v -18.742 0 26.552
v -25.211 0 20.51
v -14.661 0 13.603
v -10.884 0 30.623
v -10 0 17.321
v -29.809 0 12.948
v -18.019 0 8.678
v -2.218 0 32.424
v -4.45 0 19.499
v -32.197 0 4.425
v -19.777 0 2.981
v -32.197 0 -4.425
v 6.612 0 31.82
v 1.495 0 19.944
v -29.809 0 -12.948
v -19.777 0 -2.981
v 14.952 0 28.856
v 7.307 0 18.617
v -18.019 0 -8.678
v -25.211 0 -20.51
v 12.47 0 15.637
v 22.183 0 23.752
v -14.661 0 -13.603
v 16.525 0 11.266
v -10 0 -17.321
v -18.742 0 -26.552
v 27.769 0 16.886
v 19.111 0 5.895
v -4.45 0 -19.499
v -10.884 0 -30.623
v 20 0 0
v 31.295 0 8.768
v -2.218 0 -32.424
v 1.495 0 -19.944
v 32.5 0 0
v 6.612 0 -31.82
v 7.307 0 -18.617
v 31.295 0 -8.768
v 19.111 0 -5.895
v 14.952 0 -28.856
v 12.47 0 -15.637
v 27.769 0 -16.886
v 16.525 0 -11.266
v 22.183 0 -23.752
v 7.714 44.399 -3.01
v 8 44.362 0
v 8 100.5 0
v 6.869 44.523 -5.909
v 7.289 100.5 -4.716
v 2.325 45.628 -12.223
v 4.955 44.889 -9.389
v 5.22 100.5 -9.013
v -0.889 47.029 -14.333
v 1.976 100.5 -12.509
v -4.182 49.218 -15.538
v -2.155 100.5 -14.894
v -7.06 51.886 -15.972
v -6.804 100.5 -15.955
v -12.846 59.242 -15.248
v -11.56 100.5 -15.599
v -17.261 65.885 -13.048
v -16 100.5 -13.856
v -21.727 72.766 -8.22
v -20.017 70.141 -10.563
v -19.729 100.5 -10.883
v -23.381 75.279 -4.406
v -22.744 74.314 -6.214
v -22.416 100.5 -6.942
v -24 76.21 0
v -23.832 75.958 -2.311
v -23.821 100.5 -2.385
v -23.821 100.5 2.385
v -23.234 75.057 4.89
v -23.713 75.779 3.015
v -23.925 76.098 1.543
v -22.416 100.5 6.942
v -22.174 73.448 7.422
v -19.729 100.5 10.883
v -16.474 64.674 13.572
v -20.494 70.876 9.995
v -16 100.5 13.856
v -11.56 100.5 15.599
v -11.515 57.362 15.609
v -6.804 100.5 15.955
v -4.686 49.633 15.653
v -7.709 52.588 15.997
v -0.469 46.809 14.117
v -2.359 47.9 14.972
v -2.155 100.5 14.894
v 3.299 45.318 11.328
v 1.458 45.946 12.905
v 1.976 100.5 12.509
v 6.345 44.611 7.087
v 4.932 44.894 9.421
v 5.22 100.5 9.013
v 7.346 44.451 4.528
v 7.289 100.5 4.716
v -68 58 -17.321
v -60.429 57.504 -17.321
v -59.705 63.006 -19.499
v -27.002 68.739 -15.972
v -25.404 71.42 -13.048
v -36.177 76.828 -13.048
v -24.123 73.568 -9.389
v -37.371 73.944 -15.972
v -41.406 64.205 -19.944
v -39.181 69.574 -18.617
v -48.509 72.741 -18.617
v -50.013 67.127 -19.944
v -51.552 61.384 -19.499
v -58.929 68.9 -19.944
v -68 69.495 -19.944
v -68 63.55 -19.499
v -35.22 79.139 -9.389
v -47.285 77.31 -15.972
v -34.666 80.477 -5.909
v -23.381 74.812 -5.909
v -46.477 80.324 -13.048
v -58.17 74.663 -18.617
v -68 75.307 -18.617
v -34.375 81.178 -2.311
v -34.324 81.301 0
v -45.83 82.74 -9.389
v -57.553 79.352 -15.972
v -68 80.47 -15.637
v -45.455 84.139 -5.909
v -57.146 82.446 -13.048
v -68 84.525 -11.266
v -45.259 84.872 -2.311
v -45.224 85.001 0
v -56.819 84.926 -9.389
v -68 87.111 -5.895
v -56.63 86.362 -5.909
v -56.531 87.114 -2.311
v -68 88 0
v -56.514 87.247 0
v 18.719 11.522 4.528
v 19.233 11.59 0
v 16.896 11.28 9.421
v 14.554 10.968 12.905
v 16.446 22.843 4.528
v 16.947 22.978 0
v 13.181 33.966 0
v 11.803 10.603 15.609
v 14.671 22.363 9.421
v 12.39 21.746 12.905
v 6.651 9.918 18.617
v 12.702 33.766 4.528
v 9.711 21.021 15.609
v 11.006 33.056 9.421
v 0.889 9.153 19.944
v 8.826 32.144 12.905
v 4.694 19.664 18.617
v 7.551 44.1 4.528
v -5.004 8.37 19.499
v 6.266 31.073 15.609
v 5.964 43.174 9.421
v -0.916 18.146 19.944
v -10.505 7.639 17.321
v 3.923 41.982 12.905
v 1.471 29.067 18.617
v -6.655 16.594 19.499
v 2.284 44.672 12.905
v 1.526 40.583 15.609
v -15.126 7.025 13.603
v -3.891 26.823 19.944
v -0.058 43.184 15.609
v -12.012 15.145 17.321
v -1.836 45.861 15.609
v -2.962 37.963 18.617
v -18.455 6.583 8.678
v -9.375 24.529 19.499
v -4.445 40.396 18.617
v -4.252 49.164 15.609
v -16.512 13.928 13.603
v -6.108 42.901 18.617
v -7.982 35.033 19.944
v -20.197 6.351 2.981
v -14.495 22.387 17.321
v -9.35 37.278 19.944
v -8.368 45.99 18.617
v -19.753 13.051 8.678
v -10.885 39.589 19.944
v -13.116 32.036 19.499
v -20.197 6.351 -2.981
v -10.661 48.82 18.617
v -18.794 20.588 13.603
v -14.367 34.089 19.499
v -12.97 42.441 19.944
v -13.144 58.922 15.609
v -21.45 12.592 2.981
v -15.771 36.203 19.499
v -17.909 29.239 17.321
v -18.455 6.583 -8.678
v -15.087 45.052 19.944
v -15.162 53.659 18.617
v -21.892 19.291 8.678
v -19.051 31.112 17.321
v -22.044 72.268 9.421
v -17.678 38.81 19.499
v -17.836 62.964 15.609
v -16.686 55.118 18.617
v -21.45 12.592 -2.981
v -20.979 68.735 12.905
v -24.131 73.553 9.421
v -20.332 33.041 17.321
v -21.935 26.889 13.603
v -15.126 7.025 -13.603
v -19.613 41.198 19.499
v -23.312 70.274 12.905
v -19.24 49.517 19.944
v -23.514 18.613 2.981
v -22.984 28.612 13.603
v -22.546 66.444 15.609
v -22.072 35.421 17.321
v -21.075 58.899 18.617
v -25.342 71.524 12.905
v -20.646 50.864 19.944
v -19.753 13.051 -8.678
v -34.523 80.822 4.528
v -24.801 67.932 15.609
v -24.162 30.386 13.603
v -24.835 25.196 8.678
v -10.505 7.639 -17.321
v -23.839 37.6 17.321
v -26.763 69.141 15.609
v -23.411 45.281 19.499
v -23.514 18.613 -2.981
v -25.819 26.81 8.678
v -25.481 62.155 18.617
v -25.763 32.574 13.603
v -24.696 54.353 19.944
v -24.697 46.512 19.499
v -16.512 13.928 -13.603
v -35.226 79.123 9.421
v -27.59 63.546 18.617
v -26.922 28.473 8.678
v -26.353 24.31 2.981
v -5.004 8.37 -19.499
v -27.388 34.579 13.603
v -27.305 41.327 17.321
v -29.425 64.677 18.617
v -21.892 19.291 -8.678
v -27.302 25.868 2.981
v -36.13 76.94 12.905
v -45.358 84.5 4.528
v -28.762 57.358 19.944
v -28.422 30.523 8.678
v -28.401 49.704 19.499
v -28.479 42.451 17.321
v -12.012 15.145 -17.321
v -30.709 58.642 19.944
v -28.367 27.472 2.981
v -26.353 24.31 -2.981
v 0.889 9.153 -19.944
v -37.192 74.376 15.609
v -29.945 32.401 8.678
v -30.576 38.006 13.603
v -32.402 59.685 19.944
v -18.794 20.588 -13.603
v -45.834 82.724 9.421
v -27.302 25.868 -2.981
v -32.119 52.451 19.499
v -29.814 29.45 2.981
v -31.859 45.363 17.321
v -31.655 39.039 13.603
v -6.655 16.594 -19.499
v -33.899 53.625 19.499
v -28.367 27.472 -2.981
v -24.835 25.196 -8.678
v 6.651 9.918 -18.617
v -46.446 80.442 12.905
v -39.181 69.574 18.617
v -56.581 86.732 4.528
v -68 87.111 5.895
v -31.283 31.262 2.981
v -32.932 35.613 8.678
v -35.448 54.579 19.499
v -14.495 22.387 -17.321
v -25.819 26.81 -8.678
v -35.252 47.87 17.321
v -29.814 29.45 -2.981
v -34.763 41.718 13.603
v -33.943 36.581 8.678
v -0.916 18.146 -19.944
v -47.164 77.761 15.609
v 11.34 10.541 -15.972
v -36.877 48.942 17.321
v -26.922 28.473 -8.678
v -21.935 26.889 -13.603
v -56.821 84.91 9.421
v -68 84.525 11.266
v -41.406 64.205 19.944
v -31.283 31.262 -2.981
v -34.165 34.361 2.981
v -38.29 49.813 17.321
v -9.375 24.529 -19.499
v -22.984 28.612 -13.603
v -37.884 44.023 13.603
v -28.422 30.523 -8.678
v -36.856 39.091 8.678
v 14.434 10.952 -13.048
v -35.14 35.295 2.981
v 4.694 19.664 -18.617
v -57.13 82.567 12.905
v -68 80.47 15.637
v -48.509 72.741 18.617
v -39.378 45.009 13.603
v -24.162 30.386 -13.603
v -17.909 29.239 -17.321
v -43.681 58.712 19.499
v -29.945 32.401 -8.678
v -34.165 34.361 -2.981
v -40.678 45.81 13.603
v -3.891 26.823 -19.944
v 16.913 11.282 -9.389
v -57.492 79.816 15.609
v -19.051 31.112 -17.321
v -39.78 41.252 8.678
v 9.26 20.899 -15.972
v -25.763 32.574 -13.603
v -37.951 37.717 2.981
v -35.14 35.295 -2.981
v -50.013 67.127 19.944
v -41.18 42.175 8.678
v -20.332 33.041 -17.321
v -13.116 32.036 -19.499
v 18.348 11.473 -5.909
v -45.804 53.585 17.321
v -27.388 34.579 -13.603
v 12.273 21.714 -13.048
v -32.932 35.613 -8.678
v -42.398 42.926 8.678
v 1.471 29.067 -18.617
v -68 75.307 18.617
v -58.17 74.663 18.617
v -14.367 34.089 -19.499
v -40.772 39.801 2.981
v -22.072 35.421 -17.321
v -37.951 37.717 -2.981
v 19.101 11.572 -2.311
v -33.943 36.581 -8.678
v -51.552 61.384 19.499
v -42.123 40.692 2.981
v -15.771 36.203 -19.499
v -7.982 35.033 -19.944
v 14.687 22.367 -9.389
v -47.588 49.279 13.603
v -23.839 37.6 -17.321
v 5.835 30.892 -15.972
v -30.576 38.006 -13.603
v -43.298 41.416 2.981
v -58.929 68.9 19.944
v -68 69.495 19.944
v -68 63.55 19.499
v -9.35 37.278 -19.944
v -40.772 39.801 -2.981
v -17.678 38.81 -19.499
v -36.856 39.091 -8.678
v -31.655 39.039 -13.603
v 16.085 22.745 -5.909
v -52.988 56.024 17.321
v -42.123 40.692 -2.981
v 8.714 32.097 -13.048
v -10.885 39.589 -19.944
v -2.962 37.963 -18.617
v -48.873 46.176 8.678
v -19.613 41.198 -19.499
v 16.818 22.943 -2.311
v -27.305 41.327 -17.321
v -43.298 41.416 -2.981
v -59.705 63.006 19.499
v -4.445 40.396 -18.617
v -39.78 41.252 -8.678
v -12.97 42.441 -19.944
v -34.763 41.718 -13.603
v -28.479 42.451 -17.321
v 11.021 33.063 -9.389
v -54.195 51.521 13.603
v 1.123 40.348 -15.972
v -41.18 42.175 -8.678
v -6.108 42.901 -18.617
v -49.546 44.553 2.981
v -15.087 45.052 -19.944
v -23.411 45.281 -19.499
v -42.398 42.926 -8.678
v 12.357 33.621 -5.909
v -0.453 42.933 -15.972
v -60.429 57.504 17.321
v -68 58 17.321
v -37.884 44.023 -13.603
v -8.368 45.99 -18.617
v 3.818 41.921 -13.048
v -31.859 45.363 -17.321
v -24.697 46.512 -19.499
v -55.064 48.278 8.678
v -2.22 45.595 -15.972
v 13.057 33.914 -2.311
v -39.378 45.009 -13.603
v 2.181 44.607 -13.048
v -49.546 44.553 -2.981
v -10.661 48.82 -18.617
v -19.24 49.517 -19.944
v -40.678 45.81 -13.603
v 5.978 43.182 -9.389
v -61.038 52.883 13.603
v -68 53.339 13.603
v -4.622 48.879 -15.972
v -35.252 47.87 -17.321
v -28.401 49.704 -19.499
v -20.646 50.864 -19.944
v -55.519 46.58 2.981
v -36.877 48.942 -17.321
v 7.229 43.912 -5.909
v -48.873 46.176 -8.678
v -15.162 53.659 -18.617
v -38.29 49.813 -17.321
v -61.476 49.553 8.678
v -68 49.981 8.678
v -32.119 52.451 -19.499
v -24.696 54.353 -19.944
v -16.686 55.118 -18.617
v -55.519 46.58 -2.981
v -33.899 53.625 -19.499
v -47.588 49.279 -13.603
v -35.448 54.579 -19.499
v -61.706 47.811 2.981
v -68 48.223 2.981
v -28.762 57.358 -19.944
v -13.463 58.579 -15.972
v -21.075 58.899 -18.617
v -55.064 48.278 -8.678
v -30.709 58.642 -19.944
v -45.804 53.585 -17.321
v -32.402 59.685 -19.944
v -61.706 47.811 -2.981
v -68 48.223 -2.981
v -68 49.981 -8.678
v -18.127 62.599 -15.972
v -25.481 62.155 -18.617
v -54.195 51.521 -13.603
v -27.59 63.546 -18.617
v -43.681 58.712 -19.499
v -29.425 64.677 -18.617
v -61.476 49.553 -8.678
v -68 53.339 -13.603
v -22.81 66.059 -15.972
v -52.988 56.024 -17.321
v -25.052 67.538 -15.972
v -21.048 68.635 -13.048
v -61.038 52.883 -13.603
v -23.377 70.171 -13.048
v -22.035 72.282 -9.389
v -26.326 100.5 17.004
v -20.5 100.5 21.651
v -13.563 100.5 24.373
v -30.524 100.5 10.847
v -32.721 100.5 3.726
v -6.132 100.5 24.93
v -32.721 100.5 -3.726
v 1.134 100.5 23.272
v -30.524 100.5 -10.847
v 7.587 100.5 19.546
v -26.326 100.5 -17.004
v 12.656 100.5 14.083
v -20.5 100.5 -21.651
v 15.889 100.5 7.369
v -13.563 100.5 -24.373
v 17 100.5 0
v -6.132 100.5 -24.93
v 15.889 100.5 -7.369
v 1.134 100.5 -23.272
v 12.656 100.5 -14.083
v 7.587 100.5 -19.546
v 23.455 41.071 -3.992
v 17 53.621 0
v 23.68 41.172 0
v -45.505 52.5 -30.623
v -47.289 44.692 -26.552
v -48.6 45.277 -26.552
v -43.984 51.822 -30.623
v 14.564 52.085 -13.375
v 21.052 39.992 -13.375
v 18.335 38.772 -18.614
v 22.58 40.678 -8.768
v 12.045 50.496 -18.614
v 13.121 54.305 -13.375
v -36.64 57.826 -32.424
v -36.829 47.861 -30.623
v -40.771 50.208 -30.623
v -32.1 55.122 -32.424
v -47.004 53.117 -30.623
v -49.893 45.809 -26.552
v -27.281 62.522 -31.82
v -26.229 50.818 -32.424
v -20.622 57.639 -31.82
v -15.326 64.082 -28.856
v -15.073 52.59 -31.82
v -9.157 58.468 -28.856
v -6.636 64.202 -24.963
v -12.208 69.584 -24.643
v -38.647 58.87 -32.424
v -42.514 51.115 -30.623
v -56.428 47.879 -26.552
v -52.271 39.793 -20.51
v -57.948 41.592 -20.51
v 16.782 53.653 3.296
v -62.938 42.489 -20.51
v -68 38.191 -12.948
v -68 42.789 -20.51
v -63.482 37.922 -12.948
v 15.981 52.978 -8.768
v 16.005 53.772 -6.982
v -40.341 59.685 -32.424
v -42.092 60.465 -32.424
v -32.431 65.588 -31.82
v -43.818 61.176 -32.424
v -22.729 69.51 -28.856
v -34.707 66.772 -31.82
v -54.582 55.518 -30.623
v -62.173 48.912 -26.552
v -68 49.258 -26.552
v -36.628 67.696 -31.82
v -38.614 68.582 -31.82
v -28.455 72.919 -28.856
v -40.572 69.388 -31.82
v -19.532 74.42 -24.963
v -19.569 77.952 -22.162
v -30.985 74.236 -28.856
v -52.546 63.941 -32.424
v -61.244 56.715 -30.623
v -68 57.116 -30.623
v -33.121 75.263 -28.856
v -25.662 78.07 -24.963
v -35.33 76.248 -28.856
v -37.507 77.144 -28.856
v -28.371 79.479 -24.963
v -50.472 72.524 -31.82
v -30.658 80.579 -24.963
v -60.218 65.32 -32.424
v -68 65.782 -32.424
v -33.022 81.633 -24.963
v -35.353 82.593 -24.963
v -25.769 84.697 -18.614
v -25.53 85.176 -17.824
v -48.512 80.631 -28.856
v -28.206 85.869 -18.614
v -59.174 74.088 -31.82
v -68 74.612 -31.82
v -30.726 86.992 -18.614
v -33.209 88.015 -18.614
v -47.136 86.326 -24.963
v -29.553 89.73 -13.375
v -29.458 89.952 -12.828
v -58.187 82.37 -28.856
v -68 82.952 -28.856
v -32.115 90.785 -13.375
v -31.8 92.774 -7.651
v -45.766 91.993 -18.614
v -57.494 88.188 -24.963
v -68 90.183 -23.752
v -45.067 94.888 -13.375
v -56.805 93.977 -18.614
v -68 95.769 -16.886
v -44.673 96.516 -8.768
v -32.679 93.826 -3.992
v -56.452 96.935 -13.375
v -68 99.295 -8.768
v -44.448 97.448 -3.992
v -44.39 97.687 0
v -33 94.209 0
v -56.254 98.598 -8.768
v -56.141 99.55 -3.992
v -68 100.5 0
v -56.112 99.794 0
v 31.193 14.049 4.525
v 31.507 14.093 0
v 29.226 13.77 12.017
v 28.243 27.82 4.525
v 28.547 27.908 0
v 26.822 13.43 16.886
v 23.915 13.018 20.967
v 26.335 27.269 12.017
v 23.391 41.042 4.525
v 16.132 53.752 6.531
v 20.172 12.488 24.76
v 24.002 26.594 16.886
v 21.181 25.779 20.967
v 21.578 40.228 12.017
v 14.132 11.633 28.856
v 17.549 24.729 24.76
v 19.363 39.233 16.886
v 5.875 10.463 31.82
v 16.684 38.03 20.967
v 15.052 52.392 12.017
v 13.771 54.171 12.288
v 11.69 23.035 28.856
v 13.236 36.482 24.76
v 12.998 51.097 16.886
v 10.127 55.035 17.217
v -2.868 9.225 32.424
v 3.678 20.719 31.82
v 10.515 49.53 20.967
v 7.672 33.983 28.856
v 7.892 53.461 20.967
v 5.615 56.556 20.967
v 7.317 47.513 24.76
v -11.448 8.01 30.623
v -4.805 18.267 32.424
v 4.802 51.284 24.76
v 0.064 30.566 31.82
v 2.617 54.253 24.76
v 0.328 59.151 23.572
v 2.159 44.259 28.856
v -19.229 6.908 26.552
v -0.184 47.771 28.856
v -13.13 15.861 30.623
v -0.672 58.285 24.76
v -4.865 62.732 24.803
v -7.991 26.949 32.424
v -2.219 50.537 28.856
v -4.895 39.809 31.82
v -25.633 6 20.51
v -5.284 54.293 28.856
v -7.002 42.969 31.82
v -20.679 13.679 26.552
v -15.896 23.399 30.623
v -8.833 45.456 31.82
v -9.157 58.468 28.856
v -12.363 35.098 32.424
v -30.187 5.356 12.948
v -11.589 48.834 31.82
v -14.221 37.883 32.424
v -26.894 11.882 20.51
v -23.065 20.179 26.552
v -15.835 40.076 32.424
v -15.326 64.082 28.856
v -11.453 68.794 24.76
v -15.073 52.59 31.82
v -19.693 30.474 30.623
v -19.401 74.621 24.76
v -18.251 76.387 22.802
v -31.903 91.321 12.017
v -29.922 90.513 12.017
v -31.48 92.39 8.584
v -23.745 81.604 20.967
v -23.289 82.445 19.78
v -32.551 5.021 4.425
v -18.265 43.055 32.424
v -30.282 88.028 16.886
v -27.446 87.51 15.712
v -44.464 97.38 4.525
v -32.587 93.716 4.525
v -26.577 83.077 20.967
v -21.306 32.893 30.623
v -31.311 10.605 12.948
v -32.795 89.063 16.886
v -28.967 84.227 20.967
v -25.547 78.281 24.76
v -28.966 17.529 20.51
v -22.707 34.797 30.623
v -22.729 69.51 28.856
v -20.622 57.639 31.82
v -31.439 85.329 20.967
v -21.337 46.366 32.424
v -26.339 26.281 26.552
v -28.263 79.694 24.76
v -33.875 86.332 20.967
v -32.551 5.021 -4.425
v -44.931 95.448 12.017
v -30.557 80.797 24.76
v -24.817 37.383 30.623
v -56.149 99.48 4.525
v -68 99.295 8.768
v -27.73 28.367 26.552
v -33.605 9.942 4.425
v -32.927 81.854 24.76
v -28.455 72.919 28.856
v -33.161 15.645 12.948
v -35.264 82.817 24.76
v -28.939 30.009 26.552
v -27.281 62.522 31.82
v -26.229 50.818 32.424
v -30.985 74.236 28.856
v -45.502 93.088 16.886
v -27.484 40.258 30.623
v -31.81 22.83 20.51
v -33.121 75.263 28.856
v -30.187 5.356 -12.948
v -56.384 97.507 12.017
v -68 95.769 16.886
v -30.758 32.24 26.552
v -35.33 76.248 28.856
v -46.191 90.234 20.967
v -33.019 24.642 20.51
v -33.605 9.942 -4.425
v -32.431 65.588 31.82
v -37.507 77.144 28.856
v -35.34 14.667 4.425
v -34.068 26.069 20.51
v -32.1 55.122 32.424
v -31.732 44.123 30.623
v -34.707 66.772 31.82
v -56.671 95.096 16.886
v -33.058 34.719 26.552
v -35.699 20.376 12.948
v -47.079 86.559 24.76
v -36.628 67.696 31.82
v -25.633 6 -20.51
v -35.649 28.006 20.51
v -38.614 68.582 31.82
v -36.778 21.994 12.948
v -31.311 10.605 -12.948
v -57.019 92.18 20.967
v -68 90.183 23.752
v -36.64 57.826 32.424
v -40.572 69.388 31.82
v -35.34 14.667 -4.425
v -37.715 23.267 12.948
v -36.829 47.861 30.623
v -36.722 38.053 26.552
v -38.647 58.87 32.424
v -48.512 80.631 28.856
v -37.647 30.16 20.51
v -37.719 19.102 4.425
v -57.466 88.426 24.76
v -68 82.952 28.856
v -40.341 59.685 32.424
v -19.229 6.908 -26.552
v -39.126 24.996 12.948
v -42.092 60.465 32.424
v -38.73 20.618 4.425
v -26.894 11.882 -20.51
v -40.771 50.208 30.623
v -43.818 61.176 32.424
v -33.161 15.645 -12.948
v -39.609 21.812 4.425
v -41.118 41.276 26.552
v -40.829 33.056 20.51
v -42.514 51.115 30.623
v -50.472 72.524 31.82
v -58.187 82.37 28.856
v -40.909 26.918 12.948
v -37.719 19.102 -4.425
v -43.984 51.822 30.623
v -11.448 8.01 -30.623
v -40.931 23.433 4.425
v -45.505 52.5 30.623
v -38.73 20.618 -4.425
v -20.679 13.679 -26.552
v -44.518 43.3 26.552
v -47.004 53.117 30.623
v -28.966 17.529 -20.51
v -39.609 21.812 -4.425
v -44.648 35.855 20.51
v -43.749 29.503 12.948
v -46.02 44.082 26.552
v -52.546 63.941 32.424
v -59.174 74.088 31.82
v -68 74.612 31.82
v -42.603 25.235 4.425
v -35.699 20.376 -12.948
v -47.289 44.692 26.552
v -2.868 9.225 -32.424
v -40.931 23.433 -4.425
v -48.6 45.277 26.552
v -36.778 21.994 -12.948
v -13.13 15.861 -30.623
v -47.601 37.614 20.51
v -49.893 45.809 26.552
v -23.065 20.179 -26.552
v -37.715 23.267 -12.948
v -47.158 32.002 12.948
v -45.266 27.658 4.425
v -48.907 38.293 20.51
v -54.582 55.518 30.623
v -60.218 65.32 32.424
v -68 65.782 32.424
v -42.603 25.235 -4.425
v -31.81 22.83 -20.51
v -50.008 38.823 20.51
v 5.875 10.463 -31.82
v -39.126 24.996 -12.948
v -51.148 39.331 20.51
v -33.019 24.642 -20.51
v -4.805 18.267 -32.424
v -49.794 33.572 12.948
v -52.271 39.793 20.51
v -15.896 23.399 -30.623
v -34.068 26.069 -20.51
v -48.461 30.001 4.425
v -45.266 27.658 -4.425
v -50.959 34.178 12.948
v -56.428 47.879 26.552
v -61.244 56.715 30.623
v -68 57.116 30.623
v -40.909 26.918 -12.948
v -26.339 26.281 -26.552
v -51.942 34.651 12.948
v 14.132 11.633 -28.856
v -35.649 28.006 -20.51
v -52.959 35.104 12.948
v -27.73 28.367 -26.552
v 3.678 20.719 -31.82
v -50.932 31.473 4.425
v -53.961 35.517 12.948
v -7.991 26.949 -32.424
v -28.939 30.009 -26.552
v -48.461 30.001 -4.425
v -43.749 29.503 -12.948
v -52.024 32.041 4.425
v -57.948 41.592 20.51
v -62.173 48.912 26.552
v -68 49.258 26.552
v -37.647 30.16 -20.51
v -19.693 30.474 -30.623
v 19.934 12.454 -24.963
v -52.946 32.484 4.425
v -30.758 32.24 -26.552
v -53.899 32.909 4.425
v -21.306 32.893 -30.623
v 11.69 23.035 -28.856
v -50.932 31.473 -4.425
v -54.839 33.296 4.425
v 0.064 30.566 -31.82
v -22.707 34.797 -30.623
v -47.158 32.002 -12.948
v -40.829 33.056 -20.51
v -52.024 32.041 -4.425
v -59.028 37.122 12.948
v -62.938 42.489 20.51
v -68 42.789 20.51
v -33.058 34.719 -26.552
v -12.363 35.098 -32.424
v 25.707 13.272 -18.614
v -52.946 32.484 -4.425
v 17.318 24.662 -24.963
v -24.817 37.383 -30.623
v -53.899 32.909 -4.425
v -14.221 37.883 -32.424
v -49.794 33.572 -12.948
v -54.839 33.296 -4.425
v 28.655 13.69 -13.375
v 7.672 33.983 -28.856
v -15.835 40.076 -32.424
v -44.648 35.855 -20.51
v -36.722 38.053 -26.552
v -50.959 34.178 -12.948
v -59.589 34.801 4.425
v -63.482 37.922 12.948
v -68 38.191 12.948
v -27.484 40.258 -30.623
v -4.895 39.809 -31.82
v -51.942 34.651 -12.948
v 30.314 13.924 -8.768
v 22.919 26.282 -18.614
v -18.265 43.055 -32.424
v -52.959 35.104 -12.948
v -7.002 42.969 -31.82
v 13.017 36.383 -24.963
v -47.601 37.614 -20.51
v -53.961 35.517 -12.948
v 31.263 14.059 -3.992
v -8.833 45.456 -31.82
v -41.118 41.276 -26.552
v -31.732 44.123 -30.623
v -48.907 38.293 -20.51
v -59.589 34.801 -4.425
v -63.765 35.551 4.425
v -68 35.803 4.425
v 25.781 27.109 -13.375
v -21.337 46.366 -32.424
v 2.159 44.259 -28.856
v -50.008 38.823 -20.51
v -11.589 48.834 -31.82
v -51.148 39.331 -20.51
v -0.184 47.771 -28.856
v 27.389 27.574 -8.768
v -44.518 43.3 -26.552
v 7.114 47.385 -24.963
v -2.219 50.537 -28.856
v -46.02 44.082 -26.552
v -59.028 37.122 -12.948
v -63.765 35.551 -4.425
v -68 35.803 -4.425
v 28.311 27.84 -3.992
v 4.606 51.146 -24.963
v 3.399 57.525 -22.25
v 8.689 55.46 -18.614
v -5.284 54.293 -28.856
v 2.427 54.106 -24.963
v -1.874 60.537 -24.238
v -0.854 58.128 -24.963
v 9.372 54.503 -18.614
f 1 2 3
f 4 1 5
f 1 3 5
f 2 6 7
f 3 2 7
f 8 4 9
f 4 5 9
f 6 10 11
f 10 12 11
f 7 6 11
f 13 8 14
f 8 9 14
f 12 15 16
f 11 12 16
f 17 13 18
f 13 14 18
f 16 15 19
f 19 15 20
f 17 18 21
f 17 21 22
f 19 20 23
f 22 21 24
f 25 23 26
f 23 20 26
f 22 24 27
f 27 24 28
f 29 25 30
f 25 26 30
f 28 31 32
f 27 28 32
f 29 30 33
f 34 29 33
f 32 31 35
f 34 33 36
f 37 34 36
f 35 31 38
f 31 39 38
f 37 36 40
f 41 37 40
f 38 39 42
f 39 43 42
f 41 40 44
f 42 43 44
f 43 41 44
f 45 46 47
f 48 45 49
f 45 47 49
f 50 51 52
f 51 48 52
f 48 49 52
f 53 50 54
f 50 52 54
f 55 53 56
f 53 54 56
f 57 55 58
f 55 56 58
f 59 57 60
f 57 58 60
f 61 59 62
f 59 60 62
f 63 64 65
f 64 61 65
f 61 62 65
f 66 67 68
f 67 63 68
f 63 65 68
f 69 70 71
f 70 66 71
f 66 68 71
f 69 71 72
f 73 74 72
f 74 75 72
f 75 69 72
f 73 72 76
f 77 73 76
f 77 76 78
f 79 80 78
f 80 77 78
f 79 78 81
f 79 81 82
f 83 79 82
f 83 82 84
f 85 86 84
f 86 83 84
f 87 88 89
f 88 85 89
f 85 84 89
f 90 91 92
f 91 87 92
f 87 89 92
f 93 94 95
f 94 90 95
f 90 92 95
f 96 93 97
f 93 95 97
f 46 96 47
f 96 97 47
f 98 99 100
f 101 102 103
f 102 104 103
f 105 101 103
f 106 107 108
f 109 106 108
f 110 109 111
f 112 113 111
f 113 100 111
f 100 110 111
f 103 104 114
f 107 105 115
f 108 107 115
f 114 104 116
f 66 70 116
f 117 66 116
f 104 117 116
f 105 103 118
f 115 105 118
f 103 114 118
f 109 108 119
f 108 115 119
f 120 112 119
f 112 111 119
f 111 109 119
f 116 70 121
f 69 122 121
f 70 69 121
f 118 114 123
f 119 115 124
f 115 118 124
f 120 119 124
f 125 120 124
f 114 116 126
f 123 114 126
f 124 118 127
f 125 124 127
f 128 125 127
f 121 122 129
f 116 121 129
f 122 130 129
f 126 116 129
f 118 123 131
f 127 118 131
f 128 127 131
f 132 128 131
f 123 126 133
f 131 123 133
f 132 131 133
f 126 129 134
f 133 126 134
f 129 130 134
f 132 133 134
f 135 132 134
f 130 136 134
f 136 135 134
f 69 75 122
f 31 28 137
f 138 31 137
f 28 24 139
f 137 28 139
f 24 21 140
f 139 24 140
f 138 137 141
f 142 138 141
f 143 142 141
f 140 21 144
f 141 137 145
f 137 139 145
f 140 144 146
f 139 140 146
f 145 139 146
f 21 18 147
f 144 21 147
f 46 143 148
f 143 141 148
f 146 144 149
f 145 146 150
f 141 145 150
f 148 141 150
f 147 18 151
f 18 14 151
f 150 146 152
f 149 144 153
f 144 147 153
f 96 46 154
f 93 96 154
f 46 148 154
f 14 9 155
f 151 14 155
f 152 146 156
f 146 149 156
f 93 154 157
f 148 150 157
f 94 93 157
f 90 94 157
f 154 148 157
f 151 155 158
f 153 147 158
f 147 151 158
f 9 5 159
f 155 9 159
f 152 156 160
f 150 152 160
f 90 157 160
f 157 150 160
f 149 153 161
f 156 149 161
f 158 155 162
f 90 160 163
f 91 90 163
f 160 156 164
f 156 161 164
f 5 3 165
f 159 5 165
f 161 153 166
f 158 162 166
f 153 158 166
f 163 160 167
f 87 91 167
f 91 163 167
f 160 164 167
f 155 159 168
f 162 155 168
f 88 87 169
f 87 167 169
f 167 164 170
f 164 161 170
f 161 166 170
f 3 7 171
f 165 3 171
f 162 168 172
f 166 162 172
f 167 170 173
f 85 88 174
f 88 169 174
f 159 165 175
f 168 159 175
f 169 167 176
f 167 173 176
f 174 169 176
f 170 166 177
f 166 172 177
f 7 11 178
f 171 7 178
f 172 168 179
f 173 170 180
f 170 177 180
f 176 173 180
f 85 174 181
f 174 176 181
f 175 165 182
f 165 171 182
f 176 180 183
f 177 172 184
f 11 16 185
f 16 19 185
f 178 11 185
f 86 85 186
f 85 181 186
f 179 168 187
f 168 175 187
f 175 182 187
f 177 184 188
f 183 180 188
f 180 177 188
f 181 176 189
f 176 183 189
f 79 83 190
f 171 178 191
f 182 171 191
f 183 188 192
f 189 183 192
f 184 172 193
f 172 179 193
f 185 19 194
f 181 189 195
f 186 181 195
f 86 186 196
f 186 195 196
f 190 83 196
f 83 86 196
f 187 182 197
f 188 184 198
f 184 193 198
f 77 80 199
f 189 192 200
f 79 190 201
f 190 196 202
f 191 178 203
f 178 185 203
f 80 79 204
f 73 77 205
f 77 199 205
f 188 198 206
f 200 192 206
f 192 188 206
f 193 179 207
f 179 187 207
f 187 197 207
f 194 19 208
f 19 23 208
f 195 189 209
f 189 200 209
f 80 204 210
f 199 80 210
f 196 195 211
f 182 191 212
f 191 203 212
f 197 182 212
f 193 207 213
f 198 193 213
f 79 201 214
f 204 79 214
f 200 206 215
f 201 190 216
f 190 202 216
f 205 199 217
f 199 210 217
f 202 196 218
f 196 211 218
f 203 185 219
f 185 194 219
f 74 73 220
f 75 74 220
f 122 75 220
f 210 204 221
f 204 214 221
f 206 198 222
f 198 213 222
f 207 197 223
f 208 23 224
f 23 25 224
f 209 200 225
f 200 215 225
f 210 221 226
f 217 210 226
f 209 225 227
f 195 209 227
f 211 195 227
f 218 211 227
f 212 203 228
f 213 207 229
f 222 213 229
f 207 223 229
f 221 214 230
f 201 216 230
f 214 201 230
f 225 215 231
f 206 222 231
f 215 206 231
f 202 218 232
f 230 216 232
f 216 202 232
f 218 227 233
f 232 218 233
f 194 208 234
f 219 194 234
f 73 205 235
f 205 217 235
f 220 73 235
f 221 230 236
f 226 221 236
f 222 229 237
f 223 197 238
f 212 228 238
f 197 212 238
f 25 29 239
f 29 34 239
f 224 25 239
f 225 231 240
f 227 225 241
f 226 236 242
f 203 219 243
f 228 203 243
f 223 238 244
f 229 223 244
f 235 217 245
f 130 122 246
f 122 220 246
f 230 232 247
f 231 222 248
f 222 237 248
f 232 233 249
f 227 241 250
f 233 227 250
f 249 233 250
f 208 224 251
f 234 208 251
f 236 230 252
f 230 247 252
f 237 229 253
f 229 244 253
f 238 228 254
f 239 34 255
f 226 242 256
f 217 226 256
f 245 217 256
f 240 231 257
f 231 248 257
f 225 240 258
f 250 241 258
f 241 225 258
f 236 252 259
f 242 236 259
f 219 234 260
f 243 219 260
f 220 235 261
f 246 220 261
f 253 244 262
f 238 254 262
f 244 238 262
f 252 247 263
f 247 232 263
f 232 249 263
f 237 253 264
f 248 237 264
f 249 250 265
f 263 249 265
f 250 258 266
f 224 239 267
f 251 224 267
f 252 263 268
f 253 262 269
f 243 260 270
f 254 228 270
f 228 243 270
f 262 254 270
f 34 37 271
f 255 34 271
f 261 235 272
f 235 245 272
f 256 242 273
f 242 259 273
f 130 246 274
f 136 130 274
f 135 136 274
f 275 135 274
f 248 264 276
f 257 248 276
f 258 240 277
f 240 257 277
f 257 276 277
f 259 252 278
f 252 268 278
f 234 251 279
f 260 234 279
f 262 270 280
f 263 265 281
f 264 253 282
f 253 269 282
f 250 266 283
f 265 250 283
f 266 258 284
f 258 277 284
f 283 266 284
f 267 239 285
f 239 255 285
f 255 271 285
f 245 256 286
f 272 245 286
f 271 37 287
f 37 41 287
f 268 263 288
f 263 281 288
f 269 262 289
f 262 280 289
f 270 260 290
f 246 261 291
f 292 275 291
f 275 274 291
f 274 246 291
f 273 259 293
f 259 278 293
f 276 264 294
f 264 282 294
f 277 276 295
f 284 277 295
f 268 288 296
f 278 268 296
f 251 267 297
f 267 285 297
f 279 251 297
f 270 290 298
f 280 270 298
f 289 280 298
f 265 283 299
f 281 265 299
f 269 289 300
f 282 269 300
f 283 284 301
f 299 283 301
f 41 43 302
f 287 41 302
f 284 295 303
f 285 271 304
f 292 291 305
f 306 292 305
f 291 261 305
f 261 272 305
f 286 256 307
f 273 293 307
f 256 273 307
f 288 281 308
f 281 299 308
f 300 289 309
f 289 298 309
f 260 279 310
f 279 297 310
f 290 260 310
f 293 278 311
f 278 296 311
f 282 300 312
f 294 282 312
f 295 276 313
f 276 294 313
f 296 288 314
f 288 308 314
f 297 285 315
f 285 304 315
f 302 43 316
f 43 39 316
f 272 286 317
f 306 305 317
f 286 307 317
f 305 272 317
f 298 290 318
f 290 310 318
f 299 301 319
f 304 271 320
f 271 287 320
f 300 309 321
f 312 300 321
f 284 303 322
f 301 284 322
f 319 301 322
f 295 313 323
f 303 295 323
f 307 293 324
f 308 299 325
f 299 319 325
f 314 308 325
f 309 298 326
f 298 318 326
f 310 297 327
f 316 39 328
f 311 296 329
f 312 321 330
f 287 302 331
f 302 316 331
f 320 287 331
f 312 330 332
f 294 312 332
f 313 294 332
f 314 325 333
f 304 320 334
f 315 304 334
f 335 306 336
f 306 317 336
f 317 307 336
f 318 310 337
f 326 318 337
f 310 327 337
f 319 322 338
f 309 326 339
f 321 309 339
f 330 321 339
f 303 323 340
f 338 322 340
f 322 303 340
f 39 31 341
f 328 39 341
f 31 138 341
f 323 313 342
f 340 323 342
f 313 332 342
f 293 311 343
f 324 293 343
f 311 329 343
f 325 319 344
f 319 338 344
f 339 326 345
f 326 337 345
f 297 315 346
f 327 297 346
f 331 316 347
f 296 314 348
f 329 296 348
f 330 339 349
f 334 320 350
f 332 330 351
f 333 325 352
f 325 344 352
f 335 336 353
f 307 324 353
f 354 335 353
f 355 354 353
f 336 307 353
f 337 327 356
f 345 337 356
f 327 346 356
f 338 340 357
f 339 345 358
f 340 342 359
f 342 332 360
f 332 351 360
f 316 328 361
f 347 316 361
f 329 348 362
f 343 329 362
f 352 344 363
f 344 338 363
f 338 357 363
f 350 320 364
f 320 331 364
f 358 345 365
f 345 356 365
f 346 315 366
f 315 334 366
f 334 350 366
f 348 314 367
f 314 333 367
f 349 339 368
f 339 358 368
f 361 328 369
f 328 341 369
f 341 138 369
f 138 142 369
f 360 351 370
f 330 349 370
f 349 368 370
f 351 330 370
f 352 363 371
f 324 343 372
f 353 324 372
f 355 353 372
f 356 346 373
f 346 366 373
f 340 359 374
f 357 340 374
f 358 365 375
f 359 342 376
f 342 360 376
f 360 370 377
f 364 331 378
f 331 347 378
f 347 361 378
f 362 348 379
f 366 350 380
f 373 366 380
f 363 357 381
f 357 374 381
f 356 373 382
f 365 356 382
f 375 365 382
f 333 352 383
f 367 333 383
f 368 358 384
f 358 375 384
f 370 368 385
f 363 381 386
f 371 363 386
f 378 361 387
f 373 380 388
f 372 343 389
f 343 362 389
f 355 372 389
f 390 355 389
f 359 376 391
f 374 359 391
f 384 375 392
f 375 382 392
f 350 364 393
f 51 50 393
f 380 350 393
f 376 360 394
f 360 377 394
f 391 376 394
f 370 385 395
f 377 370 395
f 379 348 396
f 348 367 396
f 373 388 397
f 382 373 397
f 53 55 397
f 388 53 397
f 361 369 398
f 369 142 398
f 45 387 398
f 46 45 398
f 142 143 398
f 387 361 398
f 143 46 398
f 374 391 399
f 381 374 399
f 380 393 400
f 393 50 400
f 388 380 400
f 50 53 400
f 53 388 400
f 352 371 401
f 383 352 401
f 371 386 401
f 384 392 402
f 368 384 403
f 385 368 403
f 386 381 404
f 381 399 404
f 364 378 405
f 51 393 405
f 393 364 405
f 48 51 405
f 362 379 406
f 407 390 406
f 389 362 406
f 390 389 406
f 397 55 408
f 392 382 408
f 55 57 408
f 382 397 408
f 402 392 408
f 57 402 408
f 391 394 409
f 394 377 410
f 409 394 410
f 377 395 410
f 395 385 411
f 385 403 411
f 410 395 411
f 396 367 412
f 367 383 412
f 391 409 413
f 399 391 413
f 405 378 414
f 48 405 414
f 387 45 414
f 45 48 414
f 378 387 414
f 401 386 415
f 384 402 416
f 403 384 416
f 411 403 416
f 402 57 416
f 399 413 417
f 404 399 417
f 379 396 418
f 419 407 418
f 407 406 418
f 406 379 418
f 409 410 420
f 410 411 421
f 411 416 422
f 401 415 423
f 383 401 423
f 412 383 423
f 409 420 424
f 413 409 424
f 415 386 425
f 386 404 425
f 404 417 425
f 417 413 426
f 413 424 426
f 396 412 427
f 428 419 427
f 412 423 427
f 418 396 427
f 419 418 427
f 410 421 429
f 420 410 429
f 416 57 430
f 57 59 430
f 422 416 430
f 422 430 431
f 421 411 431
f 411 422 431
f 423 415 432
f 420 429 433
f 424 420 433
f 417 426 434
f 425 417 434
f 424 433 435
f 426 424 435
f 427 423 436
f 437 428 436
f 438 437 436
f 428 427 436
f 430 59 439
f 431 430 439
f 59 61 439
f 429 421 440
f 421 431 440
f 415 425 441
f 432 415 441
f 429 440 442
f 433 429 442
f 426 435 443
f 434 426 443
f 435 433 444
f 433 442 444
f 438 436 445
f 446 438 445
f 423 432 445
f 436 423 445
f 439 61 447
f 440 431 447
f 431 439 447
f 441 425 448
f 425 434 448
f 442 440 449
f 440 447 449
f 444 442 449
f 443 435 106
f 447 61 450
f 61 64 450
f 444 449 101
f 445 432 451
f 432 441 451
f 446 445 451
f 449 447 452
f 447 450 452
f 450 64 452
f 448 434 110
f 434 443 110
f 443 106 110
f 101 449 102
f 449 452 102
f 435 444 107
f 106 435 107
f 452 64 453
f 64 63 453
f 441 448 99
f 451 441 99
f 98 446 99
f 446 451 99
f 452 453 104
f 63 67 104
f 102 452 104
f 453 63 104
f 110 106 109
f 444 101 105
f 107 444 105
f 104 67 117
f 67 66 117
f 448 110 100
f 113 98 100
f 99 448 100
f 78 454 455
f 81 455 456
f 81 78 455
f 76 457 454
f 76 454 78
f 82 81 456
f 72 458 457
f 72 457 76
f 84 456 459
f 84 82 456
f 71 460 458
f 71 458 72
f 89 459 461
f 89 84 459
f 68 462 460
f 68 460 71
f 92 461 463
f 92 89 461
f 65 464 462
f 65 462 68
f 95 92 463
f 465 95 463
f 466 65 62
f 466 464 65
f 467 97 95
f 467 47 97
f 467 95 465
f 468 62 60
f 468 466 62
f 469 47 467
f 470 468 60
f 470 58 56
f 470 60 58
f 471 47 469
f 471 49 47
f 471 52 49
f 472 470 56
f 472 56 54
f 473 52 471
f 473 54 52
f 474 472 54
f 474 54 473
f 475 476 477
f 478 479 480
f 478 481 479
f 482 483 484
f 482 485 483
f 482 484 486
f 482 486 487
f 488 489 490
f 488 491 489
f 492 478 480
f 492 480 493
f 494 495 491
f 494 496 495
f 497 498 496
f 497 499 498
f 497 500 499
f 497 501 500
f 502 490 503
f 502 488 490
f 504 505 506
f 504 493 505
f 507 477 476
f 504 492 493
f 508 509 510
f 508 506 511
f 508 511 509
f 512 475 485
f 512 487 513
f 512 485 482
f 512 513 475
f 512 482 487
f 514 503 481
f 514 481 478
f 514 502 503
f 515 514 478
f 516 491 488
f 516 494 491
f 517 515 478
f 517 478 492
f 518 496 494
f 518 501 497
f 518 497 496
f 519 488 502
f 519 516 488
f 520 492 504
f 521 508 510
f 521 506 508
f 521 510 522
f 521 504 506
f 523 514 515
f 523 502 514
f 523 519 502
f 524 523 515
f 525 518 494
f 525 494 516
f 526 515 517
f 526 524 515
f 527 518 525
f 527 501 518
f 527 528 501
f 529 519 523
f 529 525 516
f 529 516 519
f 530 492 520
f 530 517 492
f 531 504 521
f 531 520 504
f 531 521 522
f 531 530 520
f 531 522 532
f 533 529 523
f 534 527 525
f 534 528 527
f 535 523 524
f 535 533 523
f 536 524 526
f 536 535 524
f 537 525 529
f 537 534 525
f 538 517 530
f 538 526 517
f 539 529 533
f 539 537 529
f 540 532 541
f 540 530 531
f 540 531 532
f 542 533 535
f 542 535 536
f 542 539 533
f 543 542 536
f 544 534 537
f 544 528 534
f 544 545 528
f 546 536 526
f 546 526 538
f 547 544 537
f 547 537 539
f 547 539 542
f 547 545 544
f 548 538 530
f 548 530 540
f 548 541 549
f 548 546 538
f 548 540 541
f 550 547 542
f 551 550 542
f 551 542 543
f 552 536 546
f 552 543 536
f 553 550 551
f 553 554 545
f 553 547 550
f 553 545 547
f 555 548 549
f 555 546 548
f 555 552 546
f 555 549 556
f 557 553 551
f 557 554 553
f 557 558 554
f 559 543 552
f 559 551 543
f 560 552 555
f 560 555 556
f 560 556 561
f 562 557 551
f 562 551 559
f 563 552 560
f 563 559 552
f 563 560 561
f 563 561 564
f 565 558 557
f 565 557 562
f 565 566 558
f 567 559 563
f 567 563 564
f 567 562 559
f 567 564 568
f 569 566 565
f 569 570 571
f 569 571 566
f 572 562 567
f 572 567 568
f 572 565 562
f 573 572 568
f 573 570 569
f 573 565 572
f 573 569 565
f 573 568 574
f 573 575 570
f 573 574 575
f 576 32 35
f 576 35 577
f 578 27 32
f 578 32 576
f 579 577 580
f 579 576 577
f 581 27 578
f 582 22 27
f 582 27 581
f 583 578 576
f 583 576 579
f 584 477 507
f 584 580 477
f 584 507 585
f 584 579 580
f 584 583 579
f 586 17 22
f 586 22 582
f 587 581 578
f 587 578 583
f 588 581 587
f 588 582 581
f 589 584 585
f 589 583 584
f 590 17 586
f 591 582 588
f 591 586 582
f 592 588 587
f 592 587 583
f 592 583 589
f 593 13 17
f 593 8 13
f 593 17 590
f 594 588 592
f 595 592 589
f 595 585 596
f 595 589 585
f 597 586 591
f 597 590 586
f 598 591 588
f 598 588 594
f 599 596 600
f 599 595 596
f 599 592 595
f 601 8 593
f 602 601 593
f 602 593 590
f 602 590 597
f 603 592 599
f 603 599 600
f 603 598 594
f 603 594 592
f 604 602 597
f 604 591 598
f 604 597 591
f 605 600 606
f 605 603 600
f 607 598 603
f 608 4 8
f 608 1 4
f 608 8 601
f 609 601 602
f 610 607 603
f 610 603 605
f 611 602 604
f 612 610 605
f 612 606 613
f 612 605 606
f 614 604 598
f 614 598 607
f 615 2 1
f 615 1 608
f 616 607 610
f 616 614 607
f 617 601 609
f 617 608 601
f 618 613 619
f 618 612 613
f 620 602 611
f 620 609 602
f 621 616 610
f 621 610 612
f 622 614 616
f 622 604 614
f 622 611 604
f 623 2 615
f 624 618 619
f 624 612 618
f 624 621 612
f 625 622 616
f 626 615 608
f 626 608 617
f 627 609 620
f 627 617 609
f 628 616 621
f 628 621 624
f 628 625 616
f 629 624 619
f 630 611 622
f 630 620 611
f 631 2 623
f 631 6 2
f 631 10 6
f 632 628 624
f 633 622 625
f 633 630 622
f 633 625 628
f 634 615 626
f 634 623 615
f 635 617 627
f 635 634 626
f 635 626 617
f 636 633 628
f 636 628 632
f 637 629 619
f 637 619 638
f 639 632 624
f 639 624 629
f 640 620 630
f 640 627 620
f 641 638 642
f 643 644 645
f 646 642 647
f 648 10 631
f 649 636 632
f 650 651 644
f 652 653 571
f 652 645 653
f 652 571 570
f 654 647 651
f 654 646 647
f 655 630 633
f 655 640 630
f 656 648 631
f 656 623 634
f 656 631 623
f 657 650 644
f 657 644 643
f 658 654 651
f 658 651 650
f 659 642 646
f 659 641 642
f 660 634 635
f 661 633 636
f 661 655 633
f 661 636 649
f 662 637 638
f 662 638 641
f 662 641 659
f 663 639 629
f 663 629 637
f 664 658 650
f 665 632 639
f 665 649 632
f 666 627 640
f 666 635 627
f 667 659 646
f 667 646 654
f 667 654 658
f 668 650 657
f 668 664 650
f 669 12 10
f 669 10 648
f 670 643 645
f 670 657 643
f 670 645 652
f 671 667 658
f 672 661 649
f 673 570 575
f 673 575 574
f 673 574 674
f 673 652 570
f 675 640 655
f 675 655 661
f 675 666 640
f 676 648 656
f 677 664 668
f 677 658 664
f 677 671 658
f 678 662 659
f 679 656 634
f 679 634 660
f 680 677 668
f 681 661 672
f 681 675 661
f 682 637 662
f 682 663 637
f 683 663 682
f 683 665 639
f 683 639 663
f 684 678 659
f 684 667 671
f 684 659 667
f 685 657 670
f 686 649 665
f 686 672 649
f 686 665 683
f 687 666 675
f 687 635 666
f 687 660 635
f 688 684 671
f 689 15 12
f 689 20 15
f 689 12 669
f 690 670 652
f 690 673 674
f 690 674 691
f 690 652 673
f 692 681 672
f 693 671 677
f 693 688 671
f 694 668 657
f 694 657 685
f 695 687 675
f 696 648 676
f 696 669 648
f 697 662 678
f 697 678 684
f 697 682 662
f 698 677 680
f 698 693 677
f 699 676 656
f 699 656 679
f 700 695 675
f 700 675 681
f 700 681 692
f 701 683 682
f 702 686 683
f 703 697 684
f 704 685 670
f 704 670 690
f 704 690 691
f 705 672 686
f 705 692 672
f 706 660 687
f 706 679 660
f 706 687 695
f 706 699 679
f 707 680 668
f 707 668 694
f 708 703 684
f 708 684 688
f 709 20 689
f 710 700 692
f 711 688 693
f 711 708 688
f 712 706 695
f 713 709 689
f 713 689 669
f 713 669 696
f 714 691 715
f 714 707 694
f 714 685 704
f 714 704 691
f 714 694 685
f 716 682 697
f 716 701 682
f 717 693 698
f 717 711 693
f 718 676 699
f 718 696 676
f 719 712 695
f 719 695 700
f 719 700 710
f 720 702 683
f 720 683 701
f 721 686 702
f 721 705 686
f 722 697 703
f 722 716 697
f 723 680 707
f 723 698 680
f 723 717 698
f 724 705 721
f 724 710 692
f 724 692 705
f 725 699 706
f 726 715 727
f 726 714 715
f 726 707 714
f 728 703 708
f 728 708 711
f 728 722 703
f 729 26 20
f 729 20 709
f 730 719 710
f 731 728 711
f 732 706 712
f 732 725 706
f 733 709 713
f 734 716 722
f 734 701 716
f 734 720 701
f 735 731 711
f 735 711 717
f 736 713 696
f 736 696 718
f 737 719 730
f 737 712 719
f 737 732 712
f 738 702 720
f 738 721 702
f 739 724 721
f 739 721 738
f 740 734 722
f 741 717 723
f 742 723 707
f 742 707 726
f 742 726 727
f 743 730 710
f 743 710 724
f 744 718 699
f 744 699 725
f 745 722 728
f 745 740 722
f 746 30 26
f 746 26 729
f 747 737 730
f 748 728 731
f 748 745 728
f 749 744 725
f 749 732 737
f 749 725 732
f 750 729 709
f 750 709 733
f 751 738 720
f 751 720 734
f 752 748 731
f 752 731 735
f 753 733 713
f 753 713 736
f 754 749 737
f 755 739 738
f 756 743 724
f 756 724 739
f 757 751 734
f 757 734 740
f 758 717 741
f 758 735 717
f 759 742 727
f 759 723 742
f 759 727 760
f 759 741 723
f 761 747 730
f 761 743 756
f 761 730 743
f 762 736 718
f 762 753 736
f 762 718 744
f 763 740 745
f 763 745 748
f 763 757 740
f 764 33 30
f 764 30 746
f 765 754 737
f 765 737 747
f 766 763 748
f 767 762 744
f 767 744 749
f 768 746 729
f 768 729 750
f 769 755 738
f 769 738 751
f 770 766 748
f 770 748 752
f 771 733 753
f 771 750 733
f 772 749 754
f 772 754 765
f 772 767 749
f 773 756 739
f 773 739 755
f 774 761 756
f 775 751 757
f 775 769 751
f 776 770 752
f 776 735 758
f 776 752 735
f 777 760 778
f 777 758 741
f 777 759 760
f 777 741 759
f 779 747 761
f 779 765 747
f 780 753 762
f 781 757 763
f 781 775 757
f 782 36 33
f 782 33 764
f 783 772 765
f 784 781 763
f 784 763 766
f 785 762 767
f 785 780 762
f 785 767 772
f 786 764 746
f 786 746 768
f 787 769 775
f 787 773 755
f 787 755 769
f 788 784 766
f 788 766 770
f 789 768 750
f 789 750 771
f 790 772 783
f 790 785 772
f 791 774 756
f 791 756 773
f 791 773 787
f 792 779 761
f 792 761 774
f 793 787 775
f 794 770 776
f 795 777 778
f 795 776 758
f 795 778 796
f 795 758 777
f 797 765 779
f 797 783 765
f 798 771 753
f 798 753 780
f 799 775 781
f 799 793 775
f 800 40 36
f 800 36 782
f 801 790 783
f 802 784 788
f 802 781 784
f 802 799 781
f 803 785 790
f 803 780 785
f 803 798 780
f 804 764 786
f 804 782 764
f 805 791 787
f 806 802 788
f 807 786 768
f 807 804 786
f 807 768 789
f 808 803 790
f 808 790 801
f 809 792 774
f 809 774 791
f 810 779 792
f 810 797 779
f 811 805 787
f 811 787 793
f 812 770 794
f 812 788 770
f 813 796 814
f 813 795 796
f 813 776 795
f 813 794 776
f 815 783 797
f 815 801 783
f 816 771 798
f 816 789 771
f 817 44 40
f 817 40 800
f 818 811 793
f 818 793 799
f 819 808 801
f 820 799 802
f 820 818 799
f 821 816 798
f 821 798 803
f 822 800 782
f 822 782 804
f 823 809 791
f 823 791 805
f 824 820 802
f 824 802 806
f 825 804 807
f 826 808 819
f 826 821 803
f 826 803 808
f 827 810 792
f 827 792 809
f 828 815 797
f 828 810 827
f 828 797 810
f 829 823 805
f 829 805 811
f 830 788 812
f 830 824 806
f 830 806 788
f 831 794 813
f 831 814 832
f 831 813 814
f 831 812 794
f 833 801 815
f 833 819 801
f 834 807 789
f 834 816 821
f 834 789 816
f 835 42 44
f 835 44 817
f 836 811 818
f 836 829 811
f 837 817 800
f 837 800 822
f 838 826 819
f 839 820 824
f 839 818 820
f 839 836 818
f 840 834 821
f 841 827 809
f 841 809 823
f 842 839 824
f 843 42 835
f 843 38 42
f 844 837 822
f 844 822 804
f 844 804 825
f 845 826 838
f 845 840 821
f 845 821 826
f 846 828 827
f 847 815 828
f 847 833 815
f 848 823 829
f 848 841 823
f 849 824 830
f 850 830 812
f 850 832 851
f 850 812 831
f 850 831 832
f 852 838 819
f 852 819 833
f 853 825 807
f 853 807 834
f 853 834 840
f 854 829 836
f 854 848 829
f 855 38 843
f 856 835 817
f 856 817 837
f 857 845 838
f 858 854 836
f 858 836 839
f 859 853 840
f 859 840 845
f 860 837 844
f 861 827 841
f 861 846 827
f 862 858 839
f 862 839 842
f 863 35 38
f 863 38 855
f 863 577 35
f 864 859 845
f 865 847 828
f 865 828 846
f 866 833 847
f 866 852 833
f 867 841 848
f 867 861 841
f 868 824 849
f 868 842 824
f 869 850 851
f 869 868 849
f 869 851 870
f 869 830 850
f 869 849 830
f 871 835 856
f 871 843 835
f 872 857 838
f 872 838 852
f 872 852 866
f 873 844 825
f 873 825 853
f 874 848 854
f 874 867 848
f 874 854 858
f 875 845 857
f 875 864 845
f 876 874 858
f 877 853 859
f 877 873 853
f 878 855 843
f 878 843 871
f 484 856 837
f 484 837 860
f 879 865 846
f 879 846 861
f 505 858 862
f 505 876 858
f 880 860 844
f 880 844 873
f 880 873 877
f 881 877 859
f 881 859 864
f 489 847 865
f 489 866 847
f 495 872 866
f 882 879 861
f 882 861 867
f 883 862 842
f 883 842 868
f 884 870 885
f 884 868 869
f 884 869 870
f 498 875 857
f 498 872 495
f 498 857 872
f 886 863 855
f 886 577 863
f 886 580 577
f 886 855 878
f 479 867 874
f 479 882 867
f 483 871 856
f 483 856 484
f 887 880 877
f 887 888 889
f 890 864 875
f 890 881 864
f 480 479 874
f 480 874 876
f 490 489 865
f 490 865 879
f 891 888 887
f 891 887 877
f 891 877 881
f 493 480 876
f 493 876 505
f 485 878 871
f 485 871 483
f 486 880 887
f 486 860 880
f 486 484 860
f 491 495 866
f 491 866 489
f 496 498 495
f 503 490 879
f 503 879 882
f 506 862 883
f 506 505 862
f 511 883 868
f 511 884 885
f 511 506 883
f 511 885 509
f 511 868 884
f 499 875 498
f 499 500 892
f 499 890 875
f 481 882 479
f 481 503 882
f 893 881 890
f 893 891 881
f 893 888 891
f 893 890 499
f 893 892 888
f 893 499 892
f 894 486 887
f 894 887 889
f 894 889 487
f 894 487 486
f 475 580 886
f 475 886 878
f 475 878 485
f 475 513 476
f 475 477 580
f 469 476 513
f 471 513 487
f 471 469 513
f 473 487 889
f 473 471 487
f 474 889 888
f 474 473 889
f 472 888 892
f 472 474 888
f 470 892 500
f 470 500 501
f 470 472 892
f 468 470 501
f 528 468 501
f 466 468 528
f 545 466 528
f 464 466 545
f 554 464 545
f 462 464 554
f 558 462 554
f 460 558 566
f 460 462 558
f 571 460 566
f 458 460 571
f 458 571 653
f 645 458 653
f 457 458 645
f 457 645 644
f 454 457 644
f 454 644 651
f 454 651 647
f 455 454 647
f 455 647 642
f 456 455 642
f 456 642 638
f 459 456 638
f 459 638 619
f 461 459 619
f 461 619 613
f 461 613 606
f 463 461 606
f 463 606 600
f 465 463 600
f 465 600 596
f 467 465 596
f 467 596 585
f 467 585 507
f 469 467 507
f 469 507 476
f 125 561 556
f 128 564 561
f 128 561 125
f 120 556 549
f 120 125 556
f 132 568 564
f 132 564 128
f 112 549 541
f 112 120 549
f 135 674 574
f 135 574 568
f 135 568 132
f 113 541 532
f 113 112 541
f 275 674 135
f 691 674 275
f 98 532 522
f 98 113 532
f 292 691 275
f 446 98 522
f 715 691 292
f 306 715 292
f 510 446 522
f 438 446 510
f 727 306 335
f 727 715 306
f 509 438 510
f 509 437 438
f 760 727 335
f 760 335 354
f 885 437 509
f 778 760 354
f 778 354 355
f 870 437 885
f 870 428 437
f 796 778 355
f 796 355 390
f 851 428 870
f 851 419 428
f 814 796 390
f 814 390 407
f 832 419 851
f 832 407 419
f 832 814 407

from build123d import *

# Parameters (mm, degrees)
SKETCH_1_R          = 32.5
SKETCH_1_R_2        = 20
EXTRUDE_3_REACH     = 102.5
SKETCH_5_R          = 25
SKETCH_9_R          = 16
CUT_EXTRUDE_3_DEPTH = 80


with BuildPart() as part:
    # 扫描1: sweep along a path in 草图2
    with BuildLine(Plane.XY) as sweep_1_path:
        ThreePointArc((0, 0), (-19.916738879, 48.083261121), (-68, 68))
    # 草图1 → 扫描1 (sweep)
    with BuildSketch(Plane(origin=(0, 0, 0), x_dir=(1, 0, 0), z_dir=(0, 1, 0))):
        Circle(SKETCH_1_R)
        Circle(SKETCH_1_R_2, mode=Mode.SUBTRACT)
    sweep(path=sweep_1_path.line)

    # 草图5 → 凸台-拉伸3 (add, up to next)
    with BuildSketch(Plane(origin=(0, 100.5, 0), x_dir=(1, 0, 0), z_dir=(0, 1, 0)), mode=Mode.PRIVATE) as extrude_3_sk1:
        with Locations((-8, 0)):
            Circle(SKETCH_5_R)
    extrude_3_tool1 = extrude(extrude_3_sk1.sketch, amount=-EXTRUDE_3_REACH, mode=Mode.PRIVATE) - part.part
    add(extrude_3_tool1.solids().sort_by_distance((-8, 100.5, 0))[0])

    # 草图9 → 切除-拉伸3 (cut)
    with BuildSketch(Plane(origin=(0, 100.5, 0), x_dir=(1, 0, 0), z_dir=(0, 1, 0))):
        with Locations((-8, 0)):
            Circle(SKETCH_9_R)
    extrude(amount=-CUT_EXTRUDE_3_DEPTH, mode=Mode.SUBTRACT)


solid = part.part
